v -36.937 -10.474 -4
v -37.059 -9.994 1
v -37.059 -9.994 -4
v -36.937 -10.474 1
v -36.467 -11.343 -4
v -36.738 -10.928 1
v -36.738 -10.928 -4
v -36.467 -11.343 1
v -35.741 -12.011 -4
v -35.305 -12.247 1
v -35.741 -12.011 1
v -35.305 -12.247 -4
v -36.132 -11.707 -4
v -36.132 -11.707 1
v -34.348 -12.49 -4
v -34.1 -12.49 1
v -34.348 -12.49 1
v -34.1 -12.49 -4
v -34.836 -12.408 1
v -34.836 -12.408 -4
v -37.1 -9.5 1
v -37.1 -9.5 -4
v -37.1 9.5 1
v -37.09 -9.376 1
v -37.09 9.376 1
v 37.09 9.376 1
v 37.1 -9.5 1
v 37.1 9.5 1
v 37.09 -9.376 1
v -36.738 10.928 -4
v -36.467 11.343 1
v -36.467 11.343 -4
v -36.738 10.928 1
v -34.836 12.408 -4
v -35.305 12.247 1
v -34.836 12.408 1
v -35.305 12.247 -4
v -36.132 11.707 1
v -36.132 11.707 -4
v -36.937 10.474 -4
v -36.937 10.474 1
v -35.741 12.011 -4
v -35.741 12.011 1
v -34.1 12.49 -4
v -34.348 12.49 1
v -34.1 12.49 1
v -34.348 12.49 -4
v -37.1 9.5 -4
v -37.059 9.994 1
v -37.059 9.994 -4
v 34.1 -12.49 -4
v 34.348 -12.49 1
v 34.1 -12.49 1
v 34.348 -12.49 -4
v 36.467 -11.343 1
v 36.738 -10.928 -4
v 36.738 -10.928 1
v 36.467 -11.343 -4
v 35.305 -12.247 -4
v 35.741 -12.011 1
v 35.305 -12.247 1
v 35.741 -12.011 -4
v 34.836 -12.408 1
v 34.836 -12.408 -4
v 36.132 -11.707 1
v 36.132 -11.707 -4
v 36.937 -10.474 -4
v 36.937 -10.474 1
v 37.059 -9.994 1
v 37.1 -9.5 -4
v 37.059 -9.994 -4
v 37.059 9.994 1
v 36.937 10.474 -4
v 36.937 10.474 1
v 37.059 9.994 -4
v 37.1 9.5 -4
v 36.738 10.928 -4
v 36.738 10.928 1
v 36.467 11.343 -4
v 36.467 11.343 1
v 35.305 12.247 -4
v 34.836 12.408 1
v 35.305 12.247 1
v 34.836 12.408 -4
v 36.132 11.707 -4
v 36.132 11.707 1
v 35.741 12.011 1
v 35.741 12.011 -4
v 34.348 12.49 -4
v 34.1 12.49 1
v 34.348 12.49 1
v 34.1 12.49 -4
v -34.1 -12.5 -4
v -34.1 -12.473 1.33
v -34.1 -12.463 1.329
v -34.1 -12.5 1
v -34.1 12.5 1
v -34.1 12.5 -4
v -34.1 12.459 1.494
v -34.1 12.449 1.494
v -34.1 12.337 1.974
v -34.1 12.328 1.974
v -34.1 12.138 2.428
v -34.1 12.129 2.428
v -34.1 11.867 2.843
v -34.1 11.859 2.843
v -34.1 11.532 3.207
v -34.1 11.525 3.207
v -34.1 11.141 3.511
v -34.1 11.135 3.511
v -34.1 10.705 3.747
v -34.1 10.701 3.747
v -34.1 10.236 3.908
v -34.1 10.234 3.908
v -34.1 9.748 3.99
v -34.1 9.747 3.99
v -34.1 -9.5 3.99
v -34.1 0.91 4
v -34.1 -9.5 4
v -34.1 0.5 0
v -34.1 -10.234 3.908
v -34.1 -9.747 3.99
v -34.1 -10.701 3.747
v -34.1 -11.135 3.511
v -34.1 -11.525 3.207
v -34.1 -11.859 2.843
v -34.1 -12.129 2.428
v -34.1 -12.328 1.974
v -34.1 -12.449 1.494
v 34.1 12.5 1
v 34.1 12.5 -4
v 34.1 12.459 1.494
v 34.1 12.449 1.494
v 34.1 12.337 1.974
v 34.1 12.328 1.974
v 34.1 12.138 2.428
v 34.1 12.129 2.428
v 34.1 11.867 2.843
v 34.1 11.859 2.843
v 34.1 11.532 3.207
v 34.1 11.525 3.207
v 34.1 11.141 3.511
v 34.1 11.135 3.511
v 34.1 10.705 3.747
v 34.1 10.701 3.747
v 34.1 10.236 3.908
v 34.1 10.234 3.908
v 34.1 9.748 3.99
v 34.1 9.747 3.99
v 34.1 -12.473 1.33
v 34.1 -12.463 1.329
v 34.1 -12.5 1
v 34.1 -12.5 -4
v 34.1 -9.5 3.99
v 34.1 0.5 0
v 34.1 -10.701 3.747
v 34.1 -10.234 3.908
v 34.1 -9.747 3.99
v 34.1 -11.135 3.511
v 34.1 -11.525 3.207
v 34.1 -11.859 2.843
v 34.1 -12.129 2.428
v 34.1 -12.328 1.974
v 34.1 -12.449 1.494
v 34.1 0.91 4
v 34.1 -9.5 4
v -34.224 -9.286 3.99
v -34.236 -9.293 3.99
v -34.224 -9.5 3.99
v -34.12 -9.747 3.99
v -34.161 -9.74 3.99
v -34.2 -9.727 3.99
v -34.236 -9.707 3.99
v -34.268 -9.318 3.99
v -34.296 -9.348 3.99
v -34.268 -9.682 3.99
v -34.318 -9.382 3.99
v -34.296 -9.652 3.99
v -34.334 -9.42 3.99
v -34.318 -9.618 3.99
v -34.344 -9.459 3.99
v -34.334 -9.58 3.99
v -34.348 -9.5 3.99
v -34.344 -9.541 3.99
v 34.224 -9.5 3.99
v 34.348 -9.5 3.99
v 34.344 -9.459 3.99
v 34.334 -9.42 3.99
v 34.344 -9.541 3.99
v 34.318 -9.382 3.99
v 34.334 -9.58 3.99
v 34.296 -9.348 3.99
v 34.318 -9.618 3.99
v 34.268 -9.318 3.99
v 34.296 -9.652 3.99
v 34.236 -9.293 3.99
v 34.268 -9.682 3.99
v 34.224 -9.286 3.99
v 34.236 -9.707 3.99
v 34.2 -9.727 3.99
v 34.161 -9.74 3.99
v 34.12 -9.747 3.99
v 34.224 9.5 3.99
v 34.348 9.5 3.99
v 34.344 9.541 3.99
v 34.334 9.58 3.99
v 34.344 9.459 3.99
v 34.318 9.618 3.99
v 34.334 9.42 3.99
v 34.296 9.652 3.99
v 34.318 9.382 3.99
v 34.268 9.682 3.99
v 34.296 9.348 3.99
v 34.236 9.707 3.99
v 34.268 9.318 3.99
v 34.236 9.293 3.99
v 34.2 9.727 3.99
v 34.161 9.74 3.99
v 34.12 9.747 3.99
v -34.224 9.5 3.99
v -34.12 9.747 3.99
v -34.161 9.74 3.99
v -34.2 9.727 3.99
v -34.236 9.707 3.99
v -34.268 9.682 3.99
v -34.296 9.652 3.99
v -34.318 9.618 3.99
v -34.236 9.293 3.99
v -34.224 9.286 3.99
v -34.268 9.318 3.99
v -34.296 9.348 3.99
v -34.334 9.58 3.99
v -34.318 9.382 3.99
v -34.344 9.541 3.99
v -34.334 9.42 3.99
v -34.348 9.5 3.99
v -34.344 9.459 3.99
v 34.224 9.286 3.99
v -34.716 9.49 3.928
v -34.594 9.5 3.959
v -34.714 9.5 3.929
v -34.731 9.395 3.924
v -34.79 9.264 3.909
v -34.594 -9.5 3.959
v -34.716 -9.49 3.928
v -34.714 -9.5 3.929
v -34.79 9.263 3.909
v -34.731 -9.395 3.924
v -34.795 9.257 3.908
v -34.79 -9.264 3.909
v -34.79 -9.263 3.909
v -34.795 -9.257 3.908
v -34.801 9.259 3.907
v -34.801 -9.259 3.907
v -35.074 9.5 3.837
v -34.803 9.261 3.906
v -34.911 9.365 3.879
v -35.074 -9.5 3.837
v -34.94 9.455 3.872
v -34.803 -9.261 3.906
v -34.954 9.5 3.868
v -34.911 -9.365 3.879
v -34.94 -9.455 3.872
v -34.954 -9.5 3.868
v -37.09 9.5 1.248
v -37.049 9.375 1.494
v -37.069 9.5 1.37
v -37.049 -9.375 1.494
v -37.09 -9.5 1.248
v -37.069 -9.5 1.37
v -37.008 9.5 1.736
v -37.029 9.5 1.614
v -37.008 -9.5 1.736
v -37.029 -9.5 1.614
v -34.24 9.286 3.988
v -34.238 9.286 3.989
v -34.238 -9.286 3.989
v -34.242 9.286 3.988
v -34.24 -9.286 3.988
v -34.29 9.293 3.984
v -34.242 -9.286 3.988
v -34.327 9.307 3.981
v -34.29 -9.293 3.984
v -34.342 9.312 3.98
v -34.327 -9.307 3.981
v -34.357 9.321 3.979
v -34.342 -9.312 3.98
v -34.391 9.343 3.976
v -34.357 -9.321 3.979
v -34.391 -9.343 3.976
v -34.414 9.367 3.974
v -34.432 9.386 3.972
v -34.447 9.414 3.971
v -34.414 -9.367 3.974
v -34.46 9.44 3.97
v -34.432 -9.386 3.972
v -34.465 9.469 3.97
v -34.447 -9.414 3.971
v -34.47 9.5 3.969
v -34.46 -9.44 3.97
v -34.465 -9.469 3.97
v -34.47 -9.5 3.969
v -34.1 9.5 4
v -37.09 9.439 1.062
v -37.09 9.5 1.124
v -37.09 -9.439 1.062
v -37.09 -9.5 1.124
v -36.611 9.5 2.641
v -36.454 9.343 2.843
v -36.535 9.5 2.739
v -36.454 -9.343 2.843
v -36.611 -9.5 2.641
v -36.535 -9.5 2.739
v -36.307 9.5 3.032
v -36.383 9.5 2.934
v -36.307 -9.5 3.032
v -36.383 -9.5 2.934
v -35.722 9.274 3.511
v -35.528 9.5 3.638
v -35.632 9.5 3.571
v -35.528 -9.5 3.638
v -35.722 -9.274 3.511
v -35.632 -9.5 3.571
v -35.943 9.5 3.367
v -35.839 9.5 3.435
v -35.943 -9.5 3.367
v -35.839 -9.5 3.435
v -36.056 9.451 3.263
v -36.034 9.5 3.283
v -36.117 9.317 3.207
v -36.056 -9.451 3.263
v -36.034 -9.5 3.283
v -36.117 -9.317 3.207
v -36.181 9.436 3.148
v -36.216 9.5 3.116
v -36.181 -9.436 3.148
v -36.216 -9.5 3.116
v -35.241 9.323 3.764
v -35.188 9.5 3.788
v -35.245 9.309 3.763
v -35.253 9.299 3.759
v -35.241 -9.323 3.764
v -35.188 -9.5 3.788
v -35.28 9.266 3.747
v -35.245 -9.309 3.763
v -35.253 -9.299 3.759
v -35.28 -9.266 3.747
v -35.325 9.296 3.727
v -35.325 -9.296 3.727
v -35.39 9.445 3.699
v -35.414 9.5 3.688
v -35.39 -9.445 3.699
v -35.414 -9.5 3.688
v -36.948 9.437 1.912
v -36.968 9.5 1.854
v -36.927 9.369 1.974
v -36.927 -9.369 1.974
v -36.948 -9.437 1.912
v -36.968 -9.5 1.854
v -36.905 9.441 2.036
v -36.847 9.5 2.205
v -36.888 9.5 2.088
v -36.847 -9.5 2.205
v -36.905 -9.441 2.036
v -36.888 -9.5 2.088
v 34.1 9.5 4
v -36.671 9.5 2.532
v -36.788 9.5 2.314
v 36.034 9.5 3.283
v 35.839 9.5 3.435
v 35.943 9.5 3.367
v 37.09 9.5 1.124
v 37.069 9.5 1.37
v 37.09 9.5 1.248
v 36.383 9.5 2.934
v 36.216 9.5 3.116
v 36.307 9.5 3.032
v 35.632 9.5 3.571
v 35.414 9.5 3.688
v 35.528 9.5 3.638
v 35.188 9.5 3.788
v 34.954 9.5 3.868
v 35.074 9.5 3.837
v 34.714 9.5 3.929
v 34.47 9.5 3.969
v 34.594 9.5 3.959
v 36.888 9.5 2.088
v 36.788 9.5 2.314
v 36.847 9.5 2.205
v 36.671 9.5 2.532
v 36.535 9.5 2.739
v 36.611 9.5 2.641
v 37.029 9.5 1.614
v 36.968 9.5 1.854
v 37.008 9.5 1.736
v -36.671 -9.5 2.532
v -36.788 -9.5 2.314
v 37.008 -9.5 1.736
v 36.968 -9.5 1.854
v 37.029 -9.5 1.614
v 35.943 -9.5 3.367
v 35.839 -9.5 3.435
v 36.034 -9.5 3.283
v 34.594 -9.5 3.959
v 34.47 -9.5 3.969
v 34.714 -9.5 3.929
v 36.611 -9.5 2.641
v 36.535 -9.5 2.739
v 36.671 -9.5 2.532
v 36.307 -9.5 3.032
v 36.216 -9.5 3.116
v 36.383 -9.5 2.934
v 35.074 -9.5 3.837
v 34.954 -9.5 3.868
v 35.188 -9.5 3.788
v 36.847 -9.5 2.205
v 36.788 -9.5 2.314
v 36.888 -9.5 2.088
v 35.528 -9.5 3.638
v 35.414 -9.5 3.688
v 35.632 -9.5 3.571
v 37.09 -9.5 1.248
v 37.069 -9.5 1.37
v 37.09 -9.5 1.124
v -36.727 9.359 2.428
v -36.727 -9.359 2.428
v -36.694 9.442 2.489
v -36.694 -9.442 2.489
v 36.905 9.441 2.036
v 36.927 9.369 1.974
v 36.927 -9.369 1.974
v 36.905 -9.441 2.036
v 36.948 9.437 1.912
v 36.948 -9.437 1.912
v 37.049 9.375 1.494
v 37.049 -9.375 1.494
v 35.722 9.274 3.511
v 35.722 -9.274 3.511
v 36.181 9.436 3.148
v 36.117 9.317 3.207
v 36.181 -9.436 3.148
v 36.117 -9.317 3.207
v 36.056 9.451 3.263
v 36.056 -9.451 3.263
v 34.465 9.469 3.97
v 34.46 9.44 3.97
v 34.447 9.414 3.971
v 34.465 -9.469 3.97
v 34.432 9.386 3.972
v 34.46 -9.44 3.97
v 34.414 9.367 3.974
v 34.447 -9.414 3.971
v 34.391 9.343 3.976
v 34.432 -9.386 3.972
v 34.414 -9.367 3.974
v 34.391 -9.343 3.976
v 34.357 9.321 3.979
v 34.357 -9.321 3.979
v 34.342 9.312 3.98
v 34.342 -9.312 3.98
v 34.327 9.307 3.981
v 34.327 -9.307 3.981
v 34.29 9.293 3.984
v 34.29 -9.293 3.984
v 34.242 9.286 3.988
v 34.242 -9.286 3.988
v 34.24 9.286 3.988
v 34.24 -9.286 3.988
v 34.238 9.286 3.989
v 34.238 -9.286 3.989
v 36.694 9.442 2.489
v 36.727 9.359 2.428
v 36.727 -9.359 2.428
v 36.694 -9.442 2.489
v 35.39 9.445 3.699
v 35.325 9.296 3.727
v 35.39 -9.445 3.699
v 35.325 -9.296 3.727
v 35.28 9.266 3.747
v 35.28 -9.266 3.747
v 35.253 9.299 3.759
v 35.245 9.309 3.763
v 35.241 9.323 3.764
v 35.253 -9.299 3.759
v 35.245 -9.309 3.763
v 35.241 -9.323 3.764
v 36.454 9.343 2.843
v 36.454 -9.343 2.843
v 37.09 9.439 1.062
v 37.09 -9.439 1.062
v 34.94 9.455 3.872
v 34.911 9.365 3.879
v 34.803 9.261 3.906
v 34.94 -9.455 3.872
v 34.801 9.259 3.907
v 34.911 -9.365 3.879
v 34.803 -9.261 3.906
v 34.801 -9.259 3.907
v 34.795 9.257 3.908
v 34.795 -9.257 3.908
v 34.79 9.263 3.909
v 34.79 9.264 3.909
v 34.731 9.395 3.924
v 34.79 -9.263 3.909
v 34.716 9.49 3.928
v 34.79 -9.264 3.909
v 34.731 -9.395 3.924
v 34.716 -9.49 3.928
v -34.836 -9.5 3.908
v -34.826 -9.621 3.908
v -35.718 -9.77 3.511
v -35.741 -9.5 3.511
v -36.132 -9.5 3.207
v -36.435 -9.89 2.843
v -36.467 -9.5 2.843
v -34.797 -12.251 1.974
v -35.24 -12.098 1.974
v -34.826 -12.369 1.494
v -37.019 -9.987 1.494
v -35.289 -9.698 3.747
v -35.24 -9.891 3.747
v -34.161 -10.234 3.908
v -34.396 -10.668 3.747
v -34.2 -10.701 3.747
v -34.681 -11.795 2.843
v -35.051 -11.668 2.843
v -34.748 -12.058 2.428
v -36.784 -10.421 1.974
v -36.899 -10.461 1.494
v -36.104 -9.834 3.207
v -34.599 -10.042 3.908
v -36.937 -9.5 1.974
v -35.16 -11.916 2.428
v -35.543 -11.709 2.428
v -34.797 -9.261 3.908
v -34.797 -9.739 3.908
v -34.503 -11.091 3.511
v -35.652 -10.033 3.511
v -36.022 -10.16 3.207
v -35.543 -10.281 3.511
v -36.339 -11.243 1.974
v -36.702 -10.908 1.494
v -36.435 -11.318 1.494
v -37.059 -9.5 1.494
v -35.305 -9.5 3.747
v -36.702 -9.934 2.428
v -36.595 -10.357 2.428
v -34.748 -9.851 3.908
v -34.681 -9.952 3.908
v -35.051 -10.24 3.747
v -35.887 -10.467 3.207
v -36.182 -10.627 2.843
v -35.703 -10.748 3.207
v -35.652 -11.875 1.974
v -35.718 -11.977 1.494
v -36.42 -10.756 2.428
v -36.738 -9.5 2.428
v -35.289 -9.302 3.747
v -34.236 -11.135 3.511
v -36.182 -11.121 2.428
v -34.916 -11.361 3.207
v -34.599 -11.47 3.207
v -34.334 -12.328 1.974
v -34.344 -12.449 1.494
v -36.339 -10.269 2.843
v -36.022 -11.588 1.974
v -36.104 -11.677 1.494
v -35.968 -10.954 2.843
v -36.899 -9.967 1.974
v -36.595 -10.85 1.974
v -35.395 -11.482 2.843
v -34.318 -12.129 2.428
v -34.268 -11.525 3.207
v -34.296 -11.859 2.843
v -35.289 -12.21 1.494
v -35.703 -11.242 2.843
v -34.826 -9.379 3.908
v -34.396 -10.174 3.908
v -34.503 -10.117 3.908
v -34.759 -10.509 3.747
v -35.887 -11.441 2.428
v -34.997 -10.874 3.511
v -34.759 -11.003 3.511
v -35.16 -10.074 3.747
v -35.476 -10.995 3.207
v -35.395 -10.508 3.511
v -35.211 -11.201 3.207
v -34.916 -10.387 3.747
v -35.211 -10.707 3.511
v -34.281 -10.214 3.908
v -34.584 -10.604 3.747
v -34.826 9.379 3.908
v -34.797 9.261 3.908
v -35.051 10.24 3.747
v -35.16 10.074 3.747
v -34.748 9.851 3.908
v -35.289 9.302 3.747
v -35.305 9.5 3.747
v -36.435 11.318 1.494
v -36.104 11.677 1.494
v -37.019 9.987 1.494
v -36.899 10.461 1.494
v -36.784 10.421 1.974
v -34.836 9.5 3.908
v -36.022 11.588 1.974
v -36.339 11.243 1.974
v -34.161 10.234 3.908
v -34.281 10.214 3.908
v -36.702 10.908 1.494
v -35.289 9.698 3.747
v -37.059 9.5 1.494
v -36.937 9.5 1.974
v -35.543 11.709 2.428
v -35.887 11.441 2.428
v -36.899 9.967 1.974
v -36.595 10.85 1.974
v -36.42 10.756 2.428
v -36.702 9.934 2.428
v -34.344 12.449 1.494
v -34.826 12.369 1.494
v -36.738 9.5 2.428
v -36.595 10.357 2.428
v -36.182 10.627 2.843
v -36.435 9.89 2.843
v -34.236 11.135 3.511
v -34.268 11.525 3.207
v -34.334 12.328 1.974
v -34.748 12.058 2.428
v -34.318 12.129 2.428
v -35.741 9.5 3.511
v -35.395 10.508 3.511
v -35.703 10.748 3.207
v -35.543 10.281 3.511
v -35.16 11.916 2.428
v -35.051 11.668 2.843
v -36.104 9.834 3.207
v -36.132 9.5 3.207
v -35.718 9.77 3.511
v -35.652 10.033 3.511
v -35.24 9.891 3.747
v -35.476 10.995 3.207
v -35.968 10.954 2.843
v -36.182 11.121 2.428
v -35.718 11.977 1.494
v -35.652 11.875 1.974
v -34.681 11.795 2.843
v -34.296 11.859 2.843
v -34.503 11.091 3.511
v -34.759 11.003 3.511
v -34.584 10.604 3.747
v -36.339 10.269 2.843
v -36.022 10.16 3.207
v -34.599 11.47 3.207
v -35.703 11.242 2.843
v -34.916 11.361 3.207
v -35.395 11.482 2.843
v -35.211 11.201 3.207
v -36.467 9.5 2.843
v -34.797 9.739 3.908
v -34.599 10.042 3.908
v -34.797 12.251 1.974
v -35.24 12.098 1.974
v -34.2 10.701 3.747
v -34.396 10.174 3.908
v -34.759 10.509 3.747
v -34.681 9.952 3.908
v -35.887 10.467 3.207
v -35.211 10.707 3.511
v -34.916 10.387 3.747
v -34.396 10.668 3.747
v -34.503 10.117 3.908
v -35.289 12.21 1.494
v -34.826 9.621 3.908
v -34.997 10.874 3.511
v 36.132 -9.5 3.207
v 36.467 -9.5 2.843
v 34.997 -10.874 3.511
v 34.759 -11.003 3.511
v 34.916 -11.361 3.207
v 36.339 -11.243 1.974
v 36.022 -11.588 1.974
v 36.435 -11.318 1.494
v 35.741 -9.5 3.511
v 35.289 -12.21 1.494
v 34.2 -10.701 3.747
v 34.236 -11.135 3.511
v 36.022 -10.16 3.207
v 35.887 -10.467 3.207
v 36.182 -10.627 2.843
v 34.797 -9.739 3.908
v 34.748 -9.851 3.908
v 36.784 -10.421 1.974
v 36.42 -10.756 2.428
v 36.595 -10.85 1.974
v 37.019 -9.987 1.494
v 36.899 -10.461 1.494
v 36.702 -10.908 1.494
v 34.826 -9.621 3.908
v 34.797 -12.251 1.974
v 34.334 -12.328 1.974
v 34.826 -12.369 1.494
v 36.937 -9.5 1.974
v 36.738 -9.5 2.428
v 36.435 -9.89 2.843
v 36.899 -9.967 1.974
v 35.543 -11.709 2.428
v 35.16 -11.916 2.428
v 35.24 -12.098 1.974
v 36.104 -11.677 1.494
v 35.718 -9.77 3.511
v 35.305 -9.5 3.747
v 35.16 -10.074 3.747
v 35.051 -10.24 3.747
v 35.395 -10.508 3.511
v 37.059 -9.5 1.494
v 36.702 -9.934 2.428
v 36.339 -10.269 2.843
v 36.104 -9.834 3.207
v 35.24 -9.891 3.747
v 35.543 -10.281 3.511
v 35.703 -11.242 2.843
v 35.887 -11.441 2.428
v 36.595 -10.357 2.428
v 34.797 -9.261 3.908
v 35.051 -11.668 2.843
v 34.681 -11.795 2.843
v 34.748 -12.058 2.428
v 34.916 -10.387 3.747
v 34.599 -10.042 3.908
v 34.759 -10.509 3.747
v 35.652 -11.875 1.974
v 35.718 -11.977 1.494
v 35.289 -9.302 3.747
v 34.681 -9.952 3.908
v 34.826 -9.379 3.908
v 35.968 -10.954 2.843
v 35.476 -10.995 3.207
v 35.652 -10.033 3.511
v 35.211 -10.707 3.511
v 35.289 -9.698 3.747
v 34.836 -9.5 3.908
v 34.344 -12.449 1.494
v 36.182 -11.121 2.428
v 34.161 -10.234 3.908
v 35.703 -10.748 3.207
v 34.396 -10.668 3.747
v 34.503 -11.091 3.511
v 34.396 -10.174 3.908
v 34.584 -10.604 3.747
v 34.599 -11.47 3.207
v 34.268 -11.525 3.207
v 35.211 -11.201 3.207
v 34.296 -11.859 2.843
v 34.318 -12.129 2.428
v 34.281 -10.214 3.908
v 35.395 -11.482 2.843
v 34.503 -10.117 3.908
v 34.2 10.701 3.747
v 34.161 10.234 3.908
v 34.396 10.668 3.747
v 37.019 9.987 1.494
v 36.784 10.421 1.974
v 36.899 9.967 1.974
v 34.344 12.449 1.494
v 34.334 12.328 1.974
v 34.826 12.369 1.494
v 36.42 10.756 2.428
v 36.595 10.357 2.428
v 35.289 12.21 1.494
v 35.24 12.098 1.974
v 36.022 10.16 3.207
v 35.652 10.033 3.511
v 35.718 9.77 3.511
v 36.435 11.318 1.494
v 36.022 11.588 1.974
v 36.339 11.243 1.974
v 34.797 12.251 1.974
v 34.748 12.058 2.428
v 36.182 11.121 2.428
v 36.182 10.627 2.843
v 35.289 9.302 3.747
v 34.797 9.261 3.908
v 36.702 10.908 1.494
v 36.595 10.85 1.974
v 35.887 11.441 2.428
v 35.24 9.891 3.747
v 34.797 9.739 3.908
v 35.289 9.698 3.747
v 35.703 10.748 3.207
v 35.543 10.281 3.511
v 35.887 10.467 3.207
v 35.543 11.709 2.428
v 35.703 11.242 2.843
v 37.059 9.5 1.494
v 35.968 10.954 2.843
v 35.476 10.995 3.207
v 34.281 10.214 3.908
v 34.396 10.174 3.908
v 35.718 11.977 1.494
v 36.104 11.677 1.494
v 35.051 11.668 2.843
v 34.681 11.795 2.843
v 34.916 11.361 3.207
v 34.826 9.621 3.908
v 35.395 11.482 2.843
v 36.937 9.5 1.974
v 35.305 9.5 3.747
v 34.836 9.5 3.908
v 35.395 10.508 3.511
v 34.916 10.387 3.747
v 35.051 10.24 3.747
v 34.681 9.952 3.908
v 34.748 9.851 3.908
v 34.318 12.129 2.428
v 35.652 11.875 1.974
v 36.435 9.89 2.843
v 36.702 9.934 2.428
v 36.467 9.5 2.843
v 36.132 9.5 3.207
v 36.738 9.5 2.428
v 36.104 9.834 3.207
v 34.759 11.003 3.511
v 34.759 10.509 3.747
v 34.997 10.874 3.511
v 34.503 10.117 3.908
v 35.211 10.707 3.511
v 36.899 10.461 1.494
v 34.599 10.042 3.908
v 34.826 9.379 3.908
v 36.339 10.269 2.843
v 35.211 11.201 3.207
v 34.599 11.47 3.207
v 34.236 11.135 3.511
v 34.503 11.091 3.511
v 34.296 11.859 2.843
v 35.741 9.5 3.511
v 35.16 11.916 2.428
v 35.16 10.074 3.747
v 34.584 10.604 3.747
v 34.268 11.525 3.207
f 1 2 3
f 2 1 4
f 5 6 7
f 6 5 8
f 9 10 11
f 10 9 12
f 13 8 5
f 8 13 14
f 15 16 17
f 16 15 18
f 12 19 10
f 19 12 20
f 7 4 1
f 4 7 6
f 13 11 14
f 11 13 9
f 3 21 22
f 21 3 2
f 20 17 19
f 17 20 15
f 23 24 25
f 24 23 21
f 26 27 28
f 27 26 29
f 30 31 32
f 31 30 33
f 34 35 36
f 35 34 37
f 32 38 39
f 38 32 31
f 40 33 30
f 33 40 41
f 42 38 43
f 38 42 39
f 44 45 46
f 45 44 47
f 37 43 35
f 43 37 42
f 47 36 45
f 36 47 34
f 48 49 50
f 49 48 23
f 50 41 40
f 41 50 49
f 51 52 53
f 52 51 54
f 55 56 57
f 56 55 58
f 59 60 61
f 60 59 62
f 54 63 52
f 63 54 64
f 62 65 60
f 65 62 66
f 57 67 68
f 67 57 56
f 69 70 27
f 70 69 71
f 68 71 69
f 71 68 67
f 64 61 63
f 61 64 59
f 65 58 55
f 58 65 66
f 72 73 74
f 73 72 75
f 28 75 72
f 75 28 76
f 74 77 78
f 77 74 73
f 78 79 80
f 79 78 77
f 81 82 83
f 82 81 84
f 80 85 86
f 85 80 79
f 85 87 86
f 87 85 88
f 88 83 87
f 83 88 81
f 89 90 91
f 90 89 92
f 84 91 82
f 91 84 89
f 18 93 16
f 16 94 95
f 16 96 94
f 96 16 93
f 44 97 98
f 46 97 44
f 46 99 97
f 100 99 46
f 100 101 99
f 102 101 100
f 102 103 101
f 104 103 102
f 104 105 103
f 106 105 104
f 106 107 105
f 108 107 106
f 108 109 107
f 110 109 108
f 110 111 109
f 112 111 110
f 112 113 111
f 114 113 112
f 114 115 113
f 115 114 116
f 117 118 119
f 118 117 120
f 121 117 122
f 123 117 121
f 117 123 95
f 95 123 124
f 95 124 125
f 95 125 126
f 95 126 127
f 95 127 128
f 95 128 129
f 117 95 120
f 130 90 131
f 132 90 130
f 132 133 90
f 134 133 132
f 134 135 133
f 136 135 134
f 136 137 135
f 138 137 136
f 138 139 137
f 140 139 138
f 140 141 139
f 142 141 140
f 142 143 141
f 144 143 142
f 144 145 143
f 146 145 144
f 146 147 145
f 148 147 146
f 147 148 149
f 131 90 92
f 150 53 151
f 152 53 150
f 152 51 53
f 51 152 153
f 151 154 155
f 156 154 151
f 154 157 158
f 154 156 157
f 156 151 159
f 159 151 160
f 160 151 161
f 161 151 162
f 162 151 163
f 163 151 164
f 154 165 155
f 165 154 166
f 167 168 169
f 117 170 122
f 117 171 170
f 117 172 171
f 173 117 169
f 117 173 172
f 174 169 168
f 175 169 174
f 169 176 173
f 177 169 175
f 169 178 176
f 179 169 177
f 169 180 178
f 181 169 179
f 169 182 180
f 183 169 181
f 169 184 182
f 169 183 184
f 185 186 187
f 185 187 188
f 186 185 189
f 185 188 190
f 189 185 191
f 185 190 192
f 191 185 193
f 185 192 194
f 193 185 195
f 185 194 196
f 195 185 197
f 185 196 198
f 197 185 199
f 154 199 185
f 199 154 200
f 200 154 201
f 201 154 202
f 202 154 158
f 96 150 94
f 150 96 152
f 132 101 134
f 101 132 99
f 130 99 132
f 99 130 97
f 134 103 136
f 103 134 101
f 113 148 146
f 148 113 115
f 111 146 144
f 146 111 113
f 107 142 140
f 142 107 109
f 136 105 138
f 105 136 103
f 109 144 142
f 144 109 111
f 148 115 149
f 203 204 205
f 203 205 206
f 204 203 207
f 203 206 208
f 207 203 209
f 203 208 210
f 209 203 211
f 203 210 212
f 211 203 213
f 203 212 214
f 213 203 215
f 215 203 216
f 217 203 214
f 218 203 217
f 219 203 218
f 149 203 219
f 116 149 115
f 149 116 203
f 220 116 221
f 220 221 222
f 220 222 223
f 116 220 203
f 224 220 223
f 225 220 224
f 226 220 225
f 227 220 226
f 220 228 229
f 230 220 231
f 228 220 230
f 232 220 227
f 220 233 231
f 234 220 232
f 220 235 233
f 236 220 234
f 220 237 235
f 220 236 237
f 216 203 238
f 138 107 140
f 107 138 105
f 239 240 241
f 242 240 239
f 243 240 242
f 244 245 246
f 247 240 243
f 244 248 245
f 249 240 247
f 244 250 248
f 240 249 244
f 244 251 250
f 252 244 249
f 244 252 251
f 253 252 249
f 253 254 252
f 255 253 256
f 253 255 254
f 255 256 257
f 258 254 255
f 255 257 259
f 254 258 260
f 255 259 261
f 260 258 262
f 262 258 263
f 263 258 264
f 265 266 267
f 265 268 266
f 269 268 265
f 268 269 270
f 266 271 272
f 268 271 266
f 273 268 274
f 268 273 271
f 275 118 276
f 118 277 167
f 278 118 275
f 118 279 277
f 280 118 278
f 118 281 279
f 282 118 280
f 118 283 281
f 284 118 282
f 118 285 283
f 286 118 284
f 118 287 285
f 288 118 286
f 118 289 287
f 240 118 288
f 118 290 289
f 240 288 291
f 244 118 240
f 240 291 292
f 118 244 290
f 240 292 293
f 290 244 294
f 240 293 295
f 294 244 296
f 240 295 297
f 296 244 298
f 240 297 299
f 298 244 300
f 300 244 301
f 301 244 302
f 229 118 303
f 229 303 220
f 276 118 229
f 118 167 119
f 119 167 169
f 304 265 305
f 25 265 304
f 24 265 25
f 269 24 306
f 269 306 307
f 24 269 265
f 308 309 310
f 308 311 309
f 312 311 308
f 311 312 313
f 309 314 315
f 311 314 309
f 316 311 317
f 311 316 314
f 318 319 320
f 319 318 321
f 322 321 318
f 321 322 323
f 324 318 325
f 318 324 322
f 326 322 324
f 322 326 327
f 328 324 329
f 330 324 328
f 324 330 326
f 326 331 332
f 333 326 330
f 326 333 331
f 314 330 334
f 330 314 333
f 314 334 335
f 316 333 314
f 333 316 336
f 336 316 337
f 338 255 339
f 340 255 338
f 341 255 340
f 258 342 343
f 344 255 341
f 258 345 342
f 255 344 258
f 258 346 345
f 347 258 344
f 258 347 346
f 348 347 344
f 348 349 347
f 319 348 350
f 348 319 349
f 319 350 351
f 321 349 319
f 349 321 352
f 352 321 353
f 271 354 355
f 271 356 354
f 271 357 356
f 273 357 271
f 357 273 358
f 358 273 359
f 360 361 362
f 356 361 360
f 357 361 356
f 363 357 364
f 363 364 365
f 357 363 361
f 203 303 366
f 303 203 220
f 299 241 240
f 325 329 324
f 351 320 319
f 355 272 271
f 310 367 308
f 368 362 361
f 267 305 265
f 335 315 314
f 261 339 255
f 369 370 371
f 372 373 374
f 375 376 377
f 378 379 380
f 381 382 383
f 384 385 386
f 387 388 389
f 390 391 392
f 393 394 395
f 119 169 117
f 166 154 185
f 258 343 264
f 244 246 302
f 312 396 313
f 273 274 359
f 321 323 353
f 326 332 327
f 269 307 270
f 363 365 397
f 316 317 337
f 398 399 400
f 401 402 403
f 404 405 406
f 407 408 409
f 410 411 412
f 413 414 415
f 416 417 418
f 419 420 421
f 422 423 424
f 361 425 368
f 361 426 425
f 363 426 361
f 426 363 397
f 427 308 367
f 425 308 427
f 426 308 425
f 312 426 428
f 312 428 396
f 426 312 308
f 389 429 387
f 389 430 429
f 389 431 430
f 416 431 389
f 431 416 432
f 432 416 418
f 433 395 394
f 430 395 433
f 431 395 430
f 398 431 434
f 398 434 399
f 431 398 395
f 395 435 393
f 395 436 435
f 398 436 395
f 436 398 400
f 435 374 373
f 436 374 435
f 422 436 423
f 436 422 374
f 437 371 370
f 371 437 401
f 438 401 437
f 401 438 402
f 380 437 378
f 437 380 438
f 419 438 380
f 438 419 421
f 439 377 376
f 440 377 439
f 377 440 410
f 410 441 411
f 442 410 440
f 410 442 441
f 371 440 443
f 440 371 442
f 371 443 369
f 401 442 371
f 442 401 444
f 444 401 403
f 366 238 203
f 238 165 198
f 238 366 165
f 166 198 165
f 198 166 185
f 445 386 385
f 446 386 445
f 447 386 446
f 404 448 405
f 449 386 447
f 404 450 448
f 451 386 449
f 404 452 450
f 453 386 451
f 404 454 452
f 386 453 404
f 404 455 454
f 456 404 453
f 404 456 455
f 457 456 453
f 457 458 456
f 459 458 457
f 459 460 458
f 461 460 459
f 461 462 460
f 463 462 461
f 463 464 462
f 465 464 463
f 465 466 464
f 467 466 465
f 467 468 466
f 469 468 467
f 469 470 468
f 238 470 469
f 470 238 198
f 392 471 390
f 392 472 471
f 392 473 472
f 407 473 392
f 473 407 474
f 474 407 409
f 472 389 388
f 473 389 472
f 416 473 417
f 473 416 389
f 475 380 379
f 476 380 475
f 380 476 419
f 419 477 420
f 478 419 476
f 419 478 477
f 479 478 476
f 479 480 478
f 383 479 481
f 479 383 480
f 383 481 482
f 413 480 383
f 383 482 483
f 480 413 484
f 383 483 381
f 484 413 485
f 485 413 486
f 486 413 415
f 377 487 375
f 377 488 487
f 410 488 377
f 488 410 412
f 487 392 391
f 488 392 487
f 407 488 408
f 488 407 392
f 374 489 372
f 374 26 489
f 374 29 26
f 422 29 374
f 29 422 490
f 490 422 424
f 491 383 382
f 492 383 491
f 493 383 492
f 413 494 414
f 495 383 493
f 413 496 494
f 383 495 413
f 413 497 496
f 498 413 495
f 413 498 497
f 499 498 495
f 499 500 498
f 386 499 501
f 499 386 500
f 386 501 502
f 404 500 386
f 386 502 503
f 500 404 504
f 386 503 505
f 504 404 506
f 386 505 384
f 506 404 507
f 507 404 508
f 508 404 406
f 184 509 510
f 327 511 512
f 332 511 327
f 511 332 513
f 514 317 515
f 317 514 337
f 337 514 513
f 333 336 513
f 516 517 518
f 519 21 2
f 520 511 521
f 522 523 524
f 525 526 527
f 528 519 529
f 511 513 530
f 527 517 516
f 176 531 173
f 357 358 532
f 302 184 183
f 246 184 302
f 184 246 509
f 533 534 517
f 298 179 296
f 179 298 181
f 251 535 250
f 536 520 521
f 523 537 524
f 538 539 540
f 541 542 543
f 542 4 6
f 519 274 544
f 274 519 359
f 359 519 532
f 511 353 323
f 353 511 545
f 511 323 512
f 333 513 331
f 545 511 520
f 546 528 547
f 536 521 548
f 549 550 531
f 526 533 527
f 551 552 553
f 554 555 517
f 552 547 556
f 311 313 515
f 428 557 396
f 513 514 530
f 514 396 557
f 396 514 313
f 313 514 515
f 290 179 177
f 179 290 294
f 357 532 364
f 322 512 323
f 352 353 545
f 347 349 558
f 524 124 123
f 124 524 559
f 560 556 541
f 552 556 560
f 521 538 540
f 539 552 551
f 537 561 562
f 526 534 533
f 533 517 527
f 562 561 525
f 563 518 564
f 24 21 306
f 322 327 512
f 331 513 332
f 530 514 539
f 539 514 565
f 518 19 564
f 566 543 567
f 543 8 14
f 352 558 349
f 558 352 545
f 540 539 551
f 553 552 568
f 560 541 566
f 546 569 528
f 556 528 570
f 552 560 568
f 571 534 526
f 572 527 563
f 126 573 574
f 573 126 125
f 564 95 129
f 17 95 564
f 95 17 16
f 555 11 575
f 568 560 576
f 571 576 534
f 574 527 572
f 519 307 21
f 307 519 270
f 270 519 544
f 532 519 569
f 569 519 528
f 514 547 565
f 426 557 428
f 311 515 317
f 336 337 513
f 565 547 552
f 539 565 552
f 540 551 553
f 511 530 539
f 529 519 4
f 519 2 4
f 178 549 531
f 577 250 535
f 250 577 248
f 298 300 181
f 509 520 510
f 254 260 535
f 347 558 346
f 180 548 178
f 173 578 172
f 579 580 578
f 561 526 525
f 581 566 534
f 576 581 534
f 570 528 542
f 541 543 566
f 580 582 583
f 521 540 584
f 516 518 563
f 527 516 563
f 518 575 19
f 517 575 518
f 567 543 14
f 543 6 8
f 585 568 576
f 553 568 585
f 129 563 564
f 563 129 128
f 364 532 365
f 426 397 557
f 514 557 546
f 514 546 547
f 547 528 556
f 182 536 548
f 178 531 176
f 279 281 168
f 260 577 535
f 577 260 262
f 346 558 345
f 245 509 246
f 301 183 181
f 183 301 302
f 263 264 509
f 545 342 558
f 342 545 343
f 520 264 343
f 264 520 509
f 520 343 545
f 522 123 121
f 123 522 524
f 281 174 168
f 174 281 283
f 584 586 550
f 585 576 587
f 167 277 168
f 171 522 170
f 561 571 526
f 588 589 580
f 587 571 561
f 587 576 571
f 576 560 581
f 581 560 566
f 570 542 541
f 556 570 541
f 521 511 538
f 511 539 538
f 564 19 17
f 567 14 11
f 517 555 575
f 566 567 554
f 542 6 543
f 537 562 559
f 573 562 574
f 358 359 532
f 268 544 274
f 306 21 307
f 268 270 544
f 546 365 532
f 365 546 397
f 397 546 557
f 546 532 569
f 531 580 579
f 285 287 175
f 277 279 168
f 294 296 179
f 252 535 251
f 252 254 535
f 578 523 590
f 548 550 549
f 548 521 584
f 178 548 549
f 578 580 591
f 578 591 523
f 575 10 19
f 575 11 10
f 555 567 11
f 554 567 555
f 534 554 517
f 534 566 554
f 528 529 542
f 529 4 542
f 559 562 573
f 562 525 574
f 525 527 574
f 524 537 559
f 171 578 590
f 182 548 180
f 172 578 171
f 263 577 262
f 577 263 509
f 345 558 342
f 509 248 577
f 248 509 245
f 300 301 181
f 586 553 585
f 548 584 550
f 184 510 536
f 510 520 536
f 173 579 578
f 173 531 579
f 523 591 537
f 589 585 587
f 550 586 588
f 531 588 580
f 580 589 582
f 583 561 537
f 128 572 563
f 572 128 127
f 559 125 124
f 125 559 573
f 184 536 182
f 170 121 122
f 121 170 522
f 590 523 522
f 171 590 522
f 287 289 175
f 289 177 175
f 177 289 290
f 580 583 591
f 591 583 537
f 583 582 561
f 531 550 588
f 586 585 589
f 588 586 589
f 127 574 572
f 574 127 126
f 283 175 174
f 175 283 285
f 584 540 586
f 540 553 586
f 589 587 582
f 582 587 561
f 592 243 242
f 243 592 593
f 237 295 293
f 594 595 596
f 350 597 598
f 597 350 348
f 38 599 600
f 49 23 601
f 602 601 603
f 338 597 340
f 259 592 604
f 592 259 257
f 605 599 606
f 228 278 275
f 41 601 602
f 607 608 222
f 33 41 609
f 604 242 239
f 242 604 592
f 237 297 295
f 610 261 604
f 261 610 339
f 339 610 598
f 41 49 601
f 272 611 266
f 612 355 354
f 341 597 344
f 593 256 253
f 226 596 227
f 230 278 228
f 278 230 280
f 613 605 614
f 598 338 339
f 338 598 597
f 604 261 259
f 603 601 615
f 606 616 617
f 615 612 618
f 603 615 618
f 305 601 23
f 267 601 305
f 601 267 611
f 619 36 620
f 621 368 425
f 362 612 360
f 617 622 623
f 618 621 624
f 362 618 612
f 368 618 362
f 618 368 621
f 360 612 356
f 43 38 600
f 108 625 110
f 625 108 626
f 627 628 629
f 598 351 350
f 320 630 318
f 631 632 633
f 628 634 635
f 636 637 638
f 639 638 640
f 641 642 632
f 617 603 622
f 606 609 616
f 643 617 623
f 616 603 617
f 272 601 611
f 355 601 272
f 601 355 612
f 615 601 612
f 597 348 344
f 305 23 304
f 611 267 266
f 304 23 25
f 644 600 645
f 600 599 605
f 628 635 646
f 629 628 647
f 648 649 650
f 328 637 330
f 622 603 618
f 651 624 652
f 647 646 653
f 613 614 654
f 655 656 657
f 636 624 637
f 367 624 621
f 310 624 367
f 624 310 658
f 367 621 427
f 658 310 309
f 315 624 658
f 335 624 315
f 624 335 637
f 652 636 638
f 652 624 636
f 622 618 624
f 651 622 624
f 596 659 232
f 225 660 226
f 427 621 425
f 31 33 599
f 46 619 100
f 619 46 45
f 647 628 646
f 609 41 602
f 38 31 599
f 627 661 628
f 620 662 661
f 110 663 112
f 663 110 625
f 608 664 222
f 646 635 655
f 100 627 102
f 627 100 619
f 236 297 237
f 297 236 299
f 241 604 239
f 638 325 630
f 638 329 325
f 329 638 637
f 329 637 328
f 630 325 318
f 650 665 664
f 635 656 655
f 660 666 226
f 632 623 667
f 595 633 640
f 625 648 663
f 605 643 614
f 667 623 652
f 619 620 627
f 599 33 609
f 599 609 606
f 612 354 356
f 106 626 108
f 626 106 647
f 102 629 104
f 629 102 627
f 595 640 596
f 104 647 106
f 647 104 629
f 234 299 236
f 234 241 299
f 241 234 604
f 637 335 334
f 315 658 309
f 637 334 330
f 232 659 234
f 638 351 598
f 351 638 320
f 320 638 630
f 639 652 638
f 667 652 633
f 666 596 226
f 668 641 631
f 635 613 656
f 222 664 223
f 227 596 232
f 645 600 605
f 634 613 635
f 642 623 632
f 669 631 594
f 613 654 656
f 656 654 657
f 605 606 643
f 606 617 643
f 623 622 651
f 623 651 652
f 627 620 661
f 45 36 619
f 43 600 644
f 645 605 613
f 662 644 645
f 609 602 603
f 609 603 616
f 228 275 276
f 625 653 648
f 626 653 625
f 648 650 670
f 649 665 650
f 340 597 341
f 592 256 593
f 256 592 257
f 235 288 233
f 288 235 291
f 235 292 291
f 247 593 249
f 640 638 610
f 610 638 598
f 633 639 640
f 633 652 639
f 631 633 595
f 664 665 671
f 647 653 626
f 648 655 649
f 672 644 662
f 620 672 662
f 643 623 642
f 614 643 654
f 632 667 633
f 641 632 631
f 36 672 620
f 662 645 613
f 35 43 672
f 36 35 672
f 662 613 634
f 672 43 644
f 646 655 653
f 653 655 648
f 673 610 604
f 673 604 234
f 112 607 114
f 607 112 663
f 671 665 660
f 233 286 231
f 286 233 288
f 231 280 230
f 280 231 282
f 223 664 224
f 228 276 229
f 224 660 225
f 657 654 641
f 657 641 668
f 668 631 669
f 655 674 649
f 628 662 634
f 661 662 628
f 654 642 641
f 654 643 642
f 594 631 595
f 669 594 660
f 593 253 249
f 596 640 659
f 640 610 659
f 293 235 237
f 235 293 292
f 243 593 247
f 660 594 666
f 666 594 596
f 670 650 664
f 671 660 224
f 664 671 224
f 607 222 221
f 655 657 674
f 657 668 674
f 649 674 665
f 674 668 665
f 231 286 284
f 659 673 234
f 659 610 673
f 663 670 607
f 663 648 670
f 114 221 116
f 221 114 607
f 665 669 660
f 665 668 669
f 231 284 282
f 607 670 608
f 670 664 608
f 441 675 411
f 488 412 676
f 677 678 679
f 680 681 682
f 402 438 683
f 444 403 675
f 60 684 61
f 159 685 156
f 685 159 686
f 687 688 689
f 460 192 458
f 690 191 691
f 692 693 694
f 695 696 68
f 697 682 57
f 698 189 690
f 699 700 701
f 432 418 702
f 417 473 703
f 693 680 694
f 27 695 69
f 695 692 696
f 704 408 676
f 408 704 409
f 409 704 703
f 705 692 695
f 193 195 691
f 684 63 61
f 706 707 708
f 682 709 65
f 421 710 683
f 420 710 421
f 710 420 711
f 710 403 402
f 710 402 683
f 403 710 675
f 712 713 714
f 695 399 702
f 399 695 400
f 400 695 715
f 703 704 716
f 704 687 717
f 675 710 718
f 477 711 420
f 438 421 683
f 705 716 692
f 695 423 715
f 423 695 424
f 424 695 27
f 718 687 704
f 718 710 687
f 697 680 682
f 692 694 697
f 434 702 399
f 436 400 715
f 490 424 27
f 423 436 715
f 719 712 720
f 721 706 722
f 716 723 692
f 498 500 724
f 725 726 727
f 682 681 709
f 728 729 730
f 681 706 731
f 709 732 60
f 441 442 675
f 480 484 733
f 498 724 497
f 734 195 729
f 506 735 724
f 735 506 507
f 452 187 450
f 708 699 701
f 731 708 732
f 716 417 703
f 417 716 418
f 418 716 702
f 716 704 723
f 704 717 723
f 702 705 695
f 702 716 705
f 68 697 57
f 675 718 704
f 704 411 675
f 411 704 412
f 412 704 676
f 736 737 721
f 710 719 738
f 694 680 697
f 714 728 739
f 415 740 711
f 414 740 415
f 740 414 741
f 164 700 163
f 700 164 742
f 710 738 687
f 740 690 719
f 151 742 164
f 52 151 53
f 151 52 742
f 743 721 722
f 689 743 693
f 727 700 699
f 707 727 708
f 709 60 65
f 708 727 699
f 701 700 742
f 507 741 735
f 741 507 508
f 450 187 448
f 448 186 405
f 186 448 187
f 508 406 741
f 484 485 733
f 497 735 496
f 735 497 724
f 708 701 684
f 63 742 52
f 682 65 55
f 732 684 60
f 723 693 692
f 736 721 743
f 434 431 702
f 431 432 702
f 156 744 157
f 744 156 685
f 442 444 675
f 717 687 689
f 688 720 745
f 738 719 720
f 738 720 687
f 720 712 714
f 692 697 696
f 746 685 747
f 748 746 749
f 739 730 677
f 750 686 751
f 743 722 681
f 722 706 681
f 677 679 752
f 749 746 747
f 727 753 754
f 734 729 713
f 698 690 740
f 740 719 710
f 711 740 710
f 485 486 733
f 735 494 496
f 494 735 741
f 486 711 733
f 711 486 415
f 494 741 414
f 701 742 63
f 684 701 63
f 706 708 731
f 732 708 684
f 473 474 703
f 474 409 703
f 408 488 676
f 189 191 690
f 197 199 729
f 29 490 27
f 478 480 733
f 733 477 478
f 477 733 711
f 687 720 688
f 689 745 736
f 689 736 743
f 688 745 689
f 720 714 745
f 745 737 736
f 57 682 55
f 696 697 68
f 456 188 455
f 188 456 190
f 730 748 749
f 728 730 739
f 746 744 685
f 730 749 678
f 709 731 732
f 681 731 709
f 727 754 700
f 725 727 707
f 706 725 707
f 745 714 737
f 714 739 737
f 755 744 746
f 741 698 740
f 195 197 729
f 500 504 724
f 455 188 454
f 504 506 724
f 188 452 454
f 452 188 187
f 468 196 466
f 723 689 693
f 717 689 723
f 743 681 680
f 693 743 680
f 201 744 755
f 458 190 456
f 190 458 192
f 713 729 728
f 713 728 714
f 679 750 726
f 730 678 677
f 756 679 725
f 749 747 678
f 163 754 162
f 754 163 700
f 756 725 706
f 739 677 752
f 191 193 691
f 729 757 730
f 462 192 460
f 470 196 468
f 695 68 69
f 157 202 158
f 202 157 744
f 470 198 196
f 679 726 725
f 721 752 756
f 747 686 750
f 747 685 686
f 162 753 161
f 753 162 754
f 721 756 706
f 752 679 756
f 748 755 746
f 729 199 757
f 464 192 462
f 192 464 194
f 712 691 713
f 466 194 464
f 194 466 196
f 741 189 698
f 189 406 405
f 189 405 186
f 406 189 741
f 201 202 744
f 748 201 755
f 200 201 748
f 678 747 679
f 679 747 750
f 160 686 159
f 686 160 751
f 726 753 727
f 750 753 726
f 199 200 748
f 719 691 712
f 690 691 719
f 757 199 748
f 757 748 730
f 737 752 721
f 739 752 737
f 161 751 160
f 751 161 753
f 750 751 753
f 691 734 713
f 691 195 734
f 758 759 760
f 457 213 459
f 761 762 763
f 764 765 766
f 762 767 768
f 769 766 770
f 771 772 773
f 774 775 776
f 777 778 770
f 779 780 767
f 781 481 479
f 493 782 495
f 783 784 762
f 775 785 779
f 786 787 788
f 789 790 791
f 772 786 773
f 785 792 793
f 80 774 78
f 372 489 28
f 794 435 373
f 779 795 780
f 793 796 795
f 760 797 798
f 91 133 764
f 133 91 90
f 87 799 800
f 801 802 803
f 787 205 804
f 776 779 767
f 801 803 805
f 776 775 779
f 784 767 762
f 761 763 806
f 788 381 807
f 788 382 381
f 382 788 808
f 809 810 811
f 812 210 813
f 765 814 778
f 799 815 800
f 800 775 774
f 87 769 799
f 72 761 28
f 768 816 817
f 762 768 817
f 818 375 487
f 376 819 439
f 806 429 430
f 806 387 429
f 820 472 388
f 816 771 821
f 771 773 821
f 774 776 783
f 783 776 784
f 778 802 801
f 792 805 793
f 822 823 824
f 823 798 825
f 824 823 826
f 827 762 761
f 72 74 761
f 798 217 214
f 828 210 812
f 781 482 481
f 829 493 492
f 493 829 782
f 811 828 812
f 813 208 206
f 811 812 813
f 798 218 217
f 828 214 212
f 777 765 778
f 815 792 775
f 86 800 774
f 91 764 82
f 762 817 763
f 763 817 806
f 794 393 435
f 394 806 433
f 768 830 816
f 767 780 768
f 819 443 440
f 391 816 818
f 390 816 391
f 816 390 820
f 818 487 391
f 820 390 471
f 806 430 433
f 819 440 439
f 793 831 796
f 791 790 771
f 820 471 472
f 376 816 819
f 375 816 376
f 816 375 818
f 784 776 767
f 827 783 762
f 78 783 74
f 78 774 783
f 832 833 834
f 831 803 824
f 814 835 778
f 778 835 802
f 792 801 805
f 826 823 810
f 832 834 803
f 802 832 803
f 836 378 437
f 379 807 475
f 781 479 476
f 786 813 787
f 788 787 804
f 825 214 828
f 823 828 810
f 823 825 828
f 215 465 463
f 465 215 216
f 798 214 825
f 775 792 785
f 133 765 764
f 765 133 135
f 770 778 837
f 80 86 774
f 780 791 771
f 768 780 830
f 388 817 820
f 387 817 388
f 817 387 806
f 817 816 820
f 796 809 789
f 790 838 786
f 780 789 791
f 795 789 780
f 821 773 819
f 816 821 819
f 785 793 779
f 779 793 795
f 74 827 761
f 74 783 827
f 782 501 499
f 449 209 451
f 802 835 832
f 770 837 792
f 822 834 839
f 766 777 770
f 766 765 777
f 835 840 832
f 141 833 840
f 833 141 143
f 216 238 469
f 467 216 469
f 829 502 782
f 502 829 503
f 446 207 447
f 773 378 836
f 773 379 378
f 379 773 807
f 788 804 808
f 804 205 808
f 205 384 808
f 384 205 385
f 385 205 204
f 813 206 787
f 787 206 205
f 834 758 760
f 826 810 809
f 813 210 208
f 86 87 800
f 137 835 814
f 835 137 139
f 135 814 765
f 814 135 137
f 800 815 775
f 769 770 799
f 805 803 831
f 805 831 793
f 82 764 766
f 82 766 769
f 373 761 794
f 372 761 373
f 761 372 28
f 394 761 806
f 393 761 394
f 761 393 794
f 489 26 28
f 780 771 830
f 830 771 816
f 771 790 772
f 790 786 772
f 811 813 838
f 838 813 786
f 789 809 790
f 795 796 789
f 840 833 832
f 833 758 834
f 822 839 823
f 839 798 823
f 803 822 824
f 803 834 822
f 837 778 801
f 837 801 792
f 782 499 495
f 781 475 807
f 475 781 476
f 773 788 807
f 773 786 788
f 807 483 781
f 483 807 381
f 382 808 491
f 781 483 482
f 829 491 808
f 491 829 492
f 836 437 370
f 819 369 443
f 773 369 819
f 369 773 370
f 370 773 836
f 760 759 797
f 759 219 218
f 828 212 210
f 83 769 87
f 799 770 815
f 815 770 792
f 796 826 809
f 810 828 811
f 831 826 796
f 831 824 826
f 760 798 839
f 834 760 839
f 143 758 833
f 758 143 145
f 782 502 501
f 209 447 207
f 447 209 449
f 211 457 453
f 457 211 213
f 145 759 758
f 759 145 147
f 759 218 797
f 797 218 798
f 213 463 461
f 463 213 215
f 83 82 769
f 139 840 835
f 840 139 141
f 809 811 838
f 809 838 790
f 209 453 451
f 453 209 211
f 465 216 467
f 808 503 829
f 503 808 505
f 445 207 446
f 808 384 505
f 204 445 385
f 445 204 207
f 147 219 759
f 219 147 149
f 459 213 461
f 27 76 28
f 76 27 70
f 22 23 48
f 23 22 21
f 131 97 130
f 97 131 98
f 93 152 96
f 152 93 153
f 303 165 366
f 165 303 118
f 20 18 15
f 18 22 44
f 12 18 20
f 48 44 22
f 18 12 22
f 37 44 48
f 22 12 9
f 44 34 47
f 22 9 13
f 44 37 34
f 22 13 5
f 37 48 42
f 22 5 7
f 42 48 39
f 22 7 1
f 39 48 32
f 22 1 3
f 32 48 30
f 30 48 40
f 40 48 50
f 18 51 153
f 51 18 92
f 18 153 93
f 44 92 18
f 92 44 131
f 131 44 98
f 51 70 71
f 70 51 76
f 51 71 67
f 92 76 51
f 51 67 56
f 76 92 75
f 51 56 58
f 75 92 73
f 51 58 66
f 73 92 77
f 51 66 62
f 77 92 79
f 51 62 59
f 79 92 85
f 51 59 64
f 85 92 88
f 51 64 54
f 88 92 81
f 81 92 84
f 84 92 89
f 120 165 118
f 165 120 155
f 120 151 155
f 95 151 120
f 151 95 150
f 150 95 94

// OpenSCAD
$fa=0.5; // default minimum facet angle is now 0.5
$fs=0.5; // default minimum facet size is now 0.5 mm

use <MCAD/boxes.scad>;

inch = 25.4;
tollerance = 2;

round_r = 3;

panel_w = 64.2;
panel_h = 117.7;
panel_base_shift = 12;

angle = acos(panel_base_shift / panel_h);

slot_w = panel_w + tollerance * 2;

craddle_w = panel_w + round_r * 2 + tollerance * 2;
craddle_h = 8;
craddle_d = 25;

correction_y = craddle_d / 2 - panel_base_shift;
correction_z = 0;

difference() {   
    union() {
        roundedBox([craddle_w, craddle_d, craddle_h], radius = round_r);
        translate([0, 0, -craddle_h/4]) roundedBox([craddle_w, craddle_d, craddle_h/2], radius = round_r, sidesonly=true);
    }
    
    aux = 40;
    translate([0, correction_y, correction_z]) rotate([angle, 0, 0]) translate([0, aux/2, aux/2]) cube([slot_w, aux, aux], center=true);
}
